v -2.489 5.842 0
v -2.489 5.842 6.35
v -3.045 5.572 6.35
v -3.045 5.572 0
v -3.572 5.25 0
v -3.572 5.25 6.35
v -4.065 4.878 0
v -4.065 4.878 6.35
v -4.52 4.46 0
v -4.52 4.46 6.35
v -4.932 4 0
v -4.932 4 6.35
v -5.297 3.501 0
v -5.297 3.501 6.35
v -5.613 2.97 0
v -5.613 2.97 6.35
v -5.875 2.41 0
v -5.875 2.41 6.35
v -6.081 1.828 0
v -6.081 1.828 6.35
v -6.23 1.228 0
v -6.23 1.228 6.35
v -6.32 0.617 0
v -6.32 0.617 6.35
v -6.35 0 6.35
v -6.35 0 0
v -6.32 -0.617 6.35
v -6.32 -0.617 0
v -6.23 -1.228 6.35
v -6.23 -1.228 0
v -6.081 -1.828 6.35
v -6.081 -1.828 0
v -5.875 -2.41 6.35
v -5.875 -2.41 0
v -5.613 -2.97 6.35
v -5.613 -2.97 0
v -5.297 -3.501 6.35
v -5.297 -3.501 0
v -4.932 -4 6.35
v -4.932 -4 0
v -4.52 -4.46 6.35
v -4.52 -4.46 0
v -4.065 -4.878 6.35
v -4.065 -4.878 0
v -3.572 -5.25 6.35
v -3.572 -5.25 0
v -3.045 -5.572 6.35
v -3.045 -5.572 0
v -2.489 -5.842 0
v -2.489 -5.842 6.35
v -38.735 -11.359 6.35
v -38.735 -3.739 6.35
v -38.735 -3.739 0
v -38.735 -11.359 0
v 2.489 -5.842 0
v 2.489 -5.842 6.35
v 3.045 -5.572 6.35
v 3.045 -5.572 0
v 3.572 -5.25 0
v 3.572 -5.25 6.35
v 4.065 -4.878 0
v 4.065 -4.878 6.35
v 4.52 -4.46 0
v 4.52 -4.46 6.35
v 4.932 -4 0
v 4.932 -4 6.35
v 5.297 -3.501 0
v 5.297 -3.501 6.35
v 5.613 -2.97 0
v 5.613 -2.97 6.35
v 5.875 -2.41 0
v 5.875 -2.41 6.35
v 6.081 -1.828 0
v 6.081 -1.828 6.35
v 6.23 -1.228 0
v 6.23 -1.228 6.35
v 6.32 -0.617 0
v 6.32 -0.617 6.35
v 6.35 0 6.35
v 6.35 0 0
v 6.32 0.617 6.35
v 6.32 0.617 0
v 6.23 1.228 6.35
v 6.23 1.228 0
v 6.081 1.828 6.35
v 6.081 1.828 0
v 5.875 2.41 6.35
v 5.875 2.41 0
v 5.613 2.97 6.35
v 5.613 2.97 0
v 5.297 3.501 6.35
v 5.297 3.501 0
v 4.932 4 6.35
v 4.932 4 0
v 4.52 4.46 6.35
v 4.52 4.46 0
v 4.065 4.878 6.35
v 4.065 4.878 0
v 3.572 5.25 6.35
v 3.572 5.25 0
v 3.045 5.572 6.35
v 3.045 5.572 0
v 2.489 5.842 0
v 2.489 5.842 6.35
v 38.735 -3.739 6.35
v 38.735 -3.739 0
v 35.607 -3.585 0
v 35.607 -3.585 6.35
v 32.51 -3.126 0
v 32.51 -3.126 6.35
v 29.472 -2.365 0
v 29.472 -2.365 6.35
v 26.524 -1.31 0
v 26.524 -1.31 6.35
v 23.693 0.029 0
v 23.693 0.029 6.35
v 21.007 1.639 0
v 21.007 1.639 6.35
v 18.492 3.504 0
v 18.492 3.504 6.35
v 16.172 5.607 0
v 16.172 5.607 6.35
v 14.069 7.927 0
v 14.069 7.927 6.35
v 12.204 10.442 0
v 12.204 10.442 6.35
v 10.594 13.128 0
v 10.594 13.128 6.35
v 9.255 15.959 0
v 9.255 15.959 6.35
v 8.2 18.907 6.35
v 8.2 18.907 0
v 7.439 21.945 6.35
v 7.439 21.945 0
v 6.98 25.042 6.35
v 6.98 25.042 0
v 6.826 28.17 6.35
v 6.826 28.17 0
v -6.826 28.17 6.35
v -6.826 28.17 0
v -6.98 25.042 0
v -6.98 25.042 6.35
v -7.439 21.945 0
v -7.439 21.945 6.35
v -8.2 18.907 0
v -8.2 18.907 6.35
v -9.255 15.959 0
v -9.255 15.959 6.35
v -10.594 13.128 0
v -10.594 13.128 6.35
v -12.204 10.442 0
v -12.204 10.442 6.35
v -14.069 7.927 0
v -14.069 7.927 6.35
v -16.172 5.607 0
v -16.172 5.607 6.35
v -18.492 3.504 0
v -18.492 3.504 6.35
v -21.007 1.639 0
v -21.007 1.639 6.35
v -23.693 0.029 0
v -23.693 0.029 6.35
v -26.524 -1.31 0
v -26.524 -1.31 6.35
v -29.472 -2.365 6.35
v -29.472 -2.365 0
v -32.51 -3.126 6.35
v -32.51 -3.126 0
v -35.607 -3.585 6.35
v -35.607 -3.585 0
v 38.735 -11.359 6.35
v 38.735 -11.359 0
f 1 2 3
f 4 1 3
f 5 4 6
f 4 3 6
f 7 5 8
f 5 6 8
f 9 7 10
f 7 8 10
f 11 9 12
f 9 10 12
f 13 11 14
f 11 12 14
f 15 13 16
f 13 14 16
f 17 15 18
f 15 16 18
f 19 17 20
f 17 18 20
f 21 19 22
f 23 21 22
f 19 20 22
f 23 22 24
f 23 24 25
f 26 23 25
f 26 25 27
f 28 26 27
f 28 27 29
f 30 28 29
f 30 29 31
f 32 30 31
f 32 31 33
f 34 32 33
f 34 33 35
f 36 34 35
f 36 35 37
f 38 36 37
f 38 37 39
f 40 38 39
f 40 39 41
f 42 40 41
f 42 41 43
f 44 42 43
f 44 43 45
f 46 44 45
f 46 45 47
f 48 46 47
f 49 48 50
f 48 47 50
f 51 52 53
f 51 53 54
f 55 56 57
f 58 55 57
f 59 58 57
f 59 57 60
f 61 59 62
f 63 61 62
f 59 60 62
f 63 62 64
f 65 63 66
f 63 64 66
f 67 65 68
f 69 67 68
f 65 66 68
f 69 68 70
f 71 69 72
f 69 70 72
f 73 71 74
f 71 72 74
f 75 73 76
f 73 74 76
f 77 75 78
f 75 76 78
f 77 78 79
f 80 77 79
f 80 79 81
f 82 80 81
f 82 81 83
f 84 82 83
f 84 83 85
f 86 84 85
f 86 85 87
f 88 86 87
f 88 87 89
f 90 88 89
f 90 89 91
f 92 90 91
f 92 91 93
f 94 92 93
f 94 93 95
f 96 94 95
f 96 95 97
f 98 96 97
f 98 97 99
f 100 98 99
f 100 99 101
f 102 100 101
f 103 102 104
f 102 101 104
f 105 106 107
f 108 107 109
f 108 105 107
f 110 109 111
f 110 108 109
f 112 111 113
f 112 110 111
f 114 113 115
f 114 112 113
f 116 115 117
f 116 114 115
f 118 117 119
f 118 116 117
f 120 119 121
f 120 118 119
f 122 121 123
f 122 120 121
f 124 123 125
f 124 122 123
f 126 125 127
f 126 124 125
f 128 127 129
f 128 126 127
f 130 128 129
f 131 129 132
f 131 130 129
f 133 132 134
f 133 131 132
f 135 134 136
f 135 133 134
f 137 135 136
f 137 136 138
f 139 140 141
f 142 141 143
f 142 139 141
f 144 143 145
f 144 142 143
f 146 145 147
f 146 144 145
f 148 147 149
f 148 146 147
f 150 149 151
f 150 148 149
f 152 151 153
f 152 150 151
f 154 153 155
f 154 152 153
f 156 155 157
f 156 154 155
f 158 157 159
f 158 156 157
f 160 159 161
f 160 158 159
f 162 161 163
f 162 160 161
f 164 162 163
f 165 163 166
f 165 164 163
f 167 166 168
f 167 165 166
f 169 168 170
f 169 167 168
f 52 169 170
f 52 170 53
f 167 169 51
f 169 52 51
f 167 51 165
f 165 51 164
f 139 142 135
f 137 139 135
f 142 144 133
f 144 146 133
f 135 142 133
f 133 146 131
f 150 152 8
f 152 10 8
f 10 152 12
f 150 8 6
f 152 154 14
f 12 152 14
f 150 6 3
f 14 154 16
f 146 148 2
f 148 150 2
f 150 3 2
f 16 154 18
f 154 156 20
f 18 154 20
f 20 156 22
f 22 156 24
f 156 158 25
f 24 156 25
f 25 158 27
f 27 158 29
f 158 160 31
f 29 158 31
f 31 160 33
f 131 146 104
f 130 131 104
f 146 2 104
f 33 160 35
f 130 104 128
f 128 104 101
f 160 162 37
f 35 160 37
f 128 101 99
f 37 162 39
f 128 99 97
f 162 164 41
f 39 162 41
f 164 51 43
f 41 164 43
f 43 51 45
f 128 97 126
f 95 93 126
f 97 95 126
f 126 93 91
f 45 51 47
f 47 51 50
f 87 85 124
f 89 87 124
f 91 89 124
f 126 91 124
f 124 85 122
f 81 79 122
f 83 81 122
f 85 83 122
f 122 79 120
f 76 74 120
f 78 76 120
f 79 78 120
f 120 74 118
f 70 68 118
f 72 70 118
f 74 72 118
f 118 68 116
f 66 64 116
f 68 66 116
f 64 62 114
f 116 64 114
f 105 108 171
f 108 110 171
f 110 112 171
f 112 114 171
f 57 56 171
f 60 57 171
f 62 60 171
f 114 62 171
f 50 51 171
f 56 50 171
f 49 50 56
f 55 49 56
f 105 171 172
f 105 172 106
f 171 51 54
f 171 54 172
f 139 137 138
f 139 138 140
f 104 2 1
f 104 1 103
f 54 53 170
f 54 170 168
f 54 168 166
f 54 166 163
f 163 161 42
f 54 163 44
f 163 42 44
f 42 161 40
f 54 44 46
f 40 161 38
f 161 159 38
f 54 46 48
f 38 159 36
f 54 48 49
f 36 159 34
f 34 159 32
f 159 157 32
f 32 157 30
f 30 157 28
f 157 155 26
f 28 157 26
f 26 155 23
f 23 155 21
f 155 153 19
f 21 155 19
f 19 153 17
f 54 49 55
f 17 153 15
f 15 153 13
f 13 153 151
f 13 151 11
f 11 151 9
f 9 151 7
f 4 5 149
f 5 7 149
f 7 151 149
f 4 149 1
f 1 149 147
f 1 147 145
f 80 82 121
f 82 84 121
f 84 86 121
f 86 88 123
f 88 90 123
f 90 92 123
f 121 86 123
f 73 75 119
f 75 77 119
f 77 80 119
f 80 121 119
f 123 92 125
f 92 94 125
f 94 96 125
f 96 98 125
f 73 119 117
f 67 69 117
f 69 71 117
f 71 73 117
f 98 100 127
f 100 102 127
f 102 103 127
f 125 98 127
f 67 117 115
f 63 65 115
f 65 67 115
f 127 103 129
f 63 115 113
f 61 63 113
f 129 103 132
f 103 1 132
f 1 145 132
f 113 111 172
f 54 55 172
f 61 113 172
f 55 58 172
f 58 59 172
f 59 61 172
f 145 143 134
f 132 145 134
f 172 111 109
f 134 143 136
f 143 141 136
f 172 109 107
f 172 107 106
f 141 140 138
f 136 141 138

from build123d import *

# Parameters (mm, degrees)
SKETCH1_W           = 129.563097232
SKETCH1_H           = 81.098705598
BOSS_EXTRUDE1_DEPTH = 6.35
SKETCH2_R           = 6.35
CUT_EXTRUDE1_DEPTH  = 77.689122785
SKETCH4_OUTSIDE_W   = 162.16
SKETCH4_OUTSIDE_H   = 113.694
CUT_EXTRUDE2_DEPTH  = 77.689122785
SKETCH6_W           = 4.977363158
SKETCH6_H           = 1.27
BOSS_EXTRUDE2_DEPTH = 6.35


with BuildPart() as part:
    # Sketch1 → Boss-Extrude1 (new body)
    with BuildSketch(Plane.XY):
        Rectangle(SKETCH1_W, SKETCH1_H)
    extrude(amount=BOSS_EXTRUDE1_DEPTH)

    # Sketch2 → Cut-Extrude1 (cut, through all)
    with BuildSketch(Plane.XY.offset(6.35)):
        Circle(SKETCH2_R)
    extrude(amount=-CUT_EXTRUDE1_DEPTH, mode=Mode.SUBTRACT)

    # Sketch4 outside → Cut-Extrude2 (cut, through all)
    with BuildSketch(Plane.XY.offset(6.35)):
        Rectangle(SKETCH4_OUTSIDE_W, SKETCH4_OUTSIDE_H)
        with BuildLine():
            Line((-38.735, -11.358813087), (38.735, -11.358813087))
            Line((38.735, -11.358813087), (38.735, -3.738813087))
            ThreePointArc((38.735, -3.738813087), (16.172106496, 5.607043409), (6.82625, 28.169936913))
            Line((6.82625, 28.169936913), (-6.82625, 28.169936913))
            ThreePointArc((-6.82625, 28.169936913), (-16.172106496, 5.607043409), (-38.735, -3.738813087))
            Line((-38.735, -3.738813087), (-38.735, -11.358813087))
        make_face(mode=Mode.SUBTRACT)
    extrude(amount=-CUT_EXTRUDE2_DEPTH, mode=Mode.SUBTRACT)

    # Sketch6 → Boss-Extrude2 (add)
    with BuildSketch(Plane.XY.offset(6.35)):
        with Locations((0, 6.477)):
            Rectangle(SKETCH6_W, SKETCH6_H)
    boss_extrude2 = extrude(amount=-BOSS_EXTRUDE2_DEPTH)

    # Mirror1: Boss-Extrude2 across plane
    add(boss_extrude2.mirror(Plane.ZX))


solid = part.part
